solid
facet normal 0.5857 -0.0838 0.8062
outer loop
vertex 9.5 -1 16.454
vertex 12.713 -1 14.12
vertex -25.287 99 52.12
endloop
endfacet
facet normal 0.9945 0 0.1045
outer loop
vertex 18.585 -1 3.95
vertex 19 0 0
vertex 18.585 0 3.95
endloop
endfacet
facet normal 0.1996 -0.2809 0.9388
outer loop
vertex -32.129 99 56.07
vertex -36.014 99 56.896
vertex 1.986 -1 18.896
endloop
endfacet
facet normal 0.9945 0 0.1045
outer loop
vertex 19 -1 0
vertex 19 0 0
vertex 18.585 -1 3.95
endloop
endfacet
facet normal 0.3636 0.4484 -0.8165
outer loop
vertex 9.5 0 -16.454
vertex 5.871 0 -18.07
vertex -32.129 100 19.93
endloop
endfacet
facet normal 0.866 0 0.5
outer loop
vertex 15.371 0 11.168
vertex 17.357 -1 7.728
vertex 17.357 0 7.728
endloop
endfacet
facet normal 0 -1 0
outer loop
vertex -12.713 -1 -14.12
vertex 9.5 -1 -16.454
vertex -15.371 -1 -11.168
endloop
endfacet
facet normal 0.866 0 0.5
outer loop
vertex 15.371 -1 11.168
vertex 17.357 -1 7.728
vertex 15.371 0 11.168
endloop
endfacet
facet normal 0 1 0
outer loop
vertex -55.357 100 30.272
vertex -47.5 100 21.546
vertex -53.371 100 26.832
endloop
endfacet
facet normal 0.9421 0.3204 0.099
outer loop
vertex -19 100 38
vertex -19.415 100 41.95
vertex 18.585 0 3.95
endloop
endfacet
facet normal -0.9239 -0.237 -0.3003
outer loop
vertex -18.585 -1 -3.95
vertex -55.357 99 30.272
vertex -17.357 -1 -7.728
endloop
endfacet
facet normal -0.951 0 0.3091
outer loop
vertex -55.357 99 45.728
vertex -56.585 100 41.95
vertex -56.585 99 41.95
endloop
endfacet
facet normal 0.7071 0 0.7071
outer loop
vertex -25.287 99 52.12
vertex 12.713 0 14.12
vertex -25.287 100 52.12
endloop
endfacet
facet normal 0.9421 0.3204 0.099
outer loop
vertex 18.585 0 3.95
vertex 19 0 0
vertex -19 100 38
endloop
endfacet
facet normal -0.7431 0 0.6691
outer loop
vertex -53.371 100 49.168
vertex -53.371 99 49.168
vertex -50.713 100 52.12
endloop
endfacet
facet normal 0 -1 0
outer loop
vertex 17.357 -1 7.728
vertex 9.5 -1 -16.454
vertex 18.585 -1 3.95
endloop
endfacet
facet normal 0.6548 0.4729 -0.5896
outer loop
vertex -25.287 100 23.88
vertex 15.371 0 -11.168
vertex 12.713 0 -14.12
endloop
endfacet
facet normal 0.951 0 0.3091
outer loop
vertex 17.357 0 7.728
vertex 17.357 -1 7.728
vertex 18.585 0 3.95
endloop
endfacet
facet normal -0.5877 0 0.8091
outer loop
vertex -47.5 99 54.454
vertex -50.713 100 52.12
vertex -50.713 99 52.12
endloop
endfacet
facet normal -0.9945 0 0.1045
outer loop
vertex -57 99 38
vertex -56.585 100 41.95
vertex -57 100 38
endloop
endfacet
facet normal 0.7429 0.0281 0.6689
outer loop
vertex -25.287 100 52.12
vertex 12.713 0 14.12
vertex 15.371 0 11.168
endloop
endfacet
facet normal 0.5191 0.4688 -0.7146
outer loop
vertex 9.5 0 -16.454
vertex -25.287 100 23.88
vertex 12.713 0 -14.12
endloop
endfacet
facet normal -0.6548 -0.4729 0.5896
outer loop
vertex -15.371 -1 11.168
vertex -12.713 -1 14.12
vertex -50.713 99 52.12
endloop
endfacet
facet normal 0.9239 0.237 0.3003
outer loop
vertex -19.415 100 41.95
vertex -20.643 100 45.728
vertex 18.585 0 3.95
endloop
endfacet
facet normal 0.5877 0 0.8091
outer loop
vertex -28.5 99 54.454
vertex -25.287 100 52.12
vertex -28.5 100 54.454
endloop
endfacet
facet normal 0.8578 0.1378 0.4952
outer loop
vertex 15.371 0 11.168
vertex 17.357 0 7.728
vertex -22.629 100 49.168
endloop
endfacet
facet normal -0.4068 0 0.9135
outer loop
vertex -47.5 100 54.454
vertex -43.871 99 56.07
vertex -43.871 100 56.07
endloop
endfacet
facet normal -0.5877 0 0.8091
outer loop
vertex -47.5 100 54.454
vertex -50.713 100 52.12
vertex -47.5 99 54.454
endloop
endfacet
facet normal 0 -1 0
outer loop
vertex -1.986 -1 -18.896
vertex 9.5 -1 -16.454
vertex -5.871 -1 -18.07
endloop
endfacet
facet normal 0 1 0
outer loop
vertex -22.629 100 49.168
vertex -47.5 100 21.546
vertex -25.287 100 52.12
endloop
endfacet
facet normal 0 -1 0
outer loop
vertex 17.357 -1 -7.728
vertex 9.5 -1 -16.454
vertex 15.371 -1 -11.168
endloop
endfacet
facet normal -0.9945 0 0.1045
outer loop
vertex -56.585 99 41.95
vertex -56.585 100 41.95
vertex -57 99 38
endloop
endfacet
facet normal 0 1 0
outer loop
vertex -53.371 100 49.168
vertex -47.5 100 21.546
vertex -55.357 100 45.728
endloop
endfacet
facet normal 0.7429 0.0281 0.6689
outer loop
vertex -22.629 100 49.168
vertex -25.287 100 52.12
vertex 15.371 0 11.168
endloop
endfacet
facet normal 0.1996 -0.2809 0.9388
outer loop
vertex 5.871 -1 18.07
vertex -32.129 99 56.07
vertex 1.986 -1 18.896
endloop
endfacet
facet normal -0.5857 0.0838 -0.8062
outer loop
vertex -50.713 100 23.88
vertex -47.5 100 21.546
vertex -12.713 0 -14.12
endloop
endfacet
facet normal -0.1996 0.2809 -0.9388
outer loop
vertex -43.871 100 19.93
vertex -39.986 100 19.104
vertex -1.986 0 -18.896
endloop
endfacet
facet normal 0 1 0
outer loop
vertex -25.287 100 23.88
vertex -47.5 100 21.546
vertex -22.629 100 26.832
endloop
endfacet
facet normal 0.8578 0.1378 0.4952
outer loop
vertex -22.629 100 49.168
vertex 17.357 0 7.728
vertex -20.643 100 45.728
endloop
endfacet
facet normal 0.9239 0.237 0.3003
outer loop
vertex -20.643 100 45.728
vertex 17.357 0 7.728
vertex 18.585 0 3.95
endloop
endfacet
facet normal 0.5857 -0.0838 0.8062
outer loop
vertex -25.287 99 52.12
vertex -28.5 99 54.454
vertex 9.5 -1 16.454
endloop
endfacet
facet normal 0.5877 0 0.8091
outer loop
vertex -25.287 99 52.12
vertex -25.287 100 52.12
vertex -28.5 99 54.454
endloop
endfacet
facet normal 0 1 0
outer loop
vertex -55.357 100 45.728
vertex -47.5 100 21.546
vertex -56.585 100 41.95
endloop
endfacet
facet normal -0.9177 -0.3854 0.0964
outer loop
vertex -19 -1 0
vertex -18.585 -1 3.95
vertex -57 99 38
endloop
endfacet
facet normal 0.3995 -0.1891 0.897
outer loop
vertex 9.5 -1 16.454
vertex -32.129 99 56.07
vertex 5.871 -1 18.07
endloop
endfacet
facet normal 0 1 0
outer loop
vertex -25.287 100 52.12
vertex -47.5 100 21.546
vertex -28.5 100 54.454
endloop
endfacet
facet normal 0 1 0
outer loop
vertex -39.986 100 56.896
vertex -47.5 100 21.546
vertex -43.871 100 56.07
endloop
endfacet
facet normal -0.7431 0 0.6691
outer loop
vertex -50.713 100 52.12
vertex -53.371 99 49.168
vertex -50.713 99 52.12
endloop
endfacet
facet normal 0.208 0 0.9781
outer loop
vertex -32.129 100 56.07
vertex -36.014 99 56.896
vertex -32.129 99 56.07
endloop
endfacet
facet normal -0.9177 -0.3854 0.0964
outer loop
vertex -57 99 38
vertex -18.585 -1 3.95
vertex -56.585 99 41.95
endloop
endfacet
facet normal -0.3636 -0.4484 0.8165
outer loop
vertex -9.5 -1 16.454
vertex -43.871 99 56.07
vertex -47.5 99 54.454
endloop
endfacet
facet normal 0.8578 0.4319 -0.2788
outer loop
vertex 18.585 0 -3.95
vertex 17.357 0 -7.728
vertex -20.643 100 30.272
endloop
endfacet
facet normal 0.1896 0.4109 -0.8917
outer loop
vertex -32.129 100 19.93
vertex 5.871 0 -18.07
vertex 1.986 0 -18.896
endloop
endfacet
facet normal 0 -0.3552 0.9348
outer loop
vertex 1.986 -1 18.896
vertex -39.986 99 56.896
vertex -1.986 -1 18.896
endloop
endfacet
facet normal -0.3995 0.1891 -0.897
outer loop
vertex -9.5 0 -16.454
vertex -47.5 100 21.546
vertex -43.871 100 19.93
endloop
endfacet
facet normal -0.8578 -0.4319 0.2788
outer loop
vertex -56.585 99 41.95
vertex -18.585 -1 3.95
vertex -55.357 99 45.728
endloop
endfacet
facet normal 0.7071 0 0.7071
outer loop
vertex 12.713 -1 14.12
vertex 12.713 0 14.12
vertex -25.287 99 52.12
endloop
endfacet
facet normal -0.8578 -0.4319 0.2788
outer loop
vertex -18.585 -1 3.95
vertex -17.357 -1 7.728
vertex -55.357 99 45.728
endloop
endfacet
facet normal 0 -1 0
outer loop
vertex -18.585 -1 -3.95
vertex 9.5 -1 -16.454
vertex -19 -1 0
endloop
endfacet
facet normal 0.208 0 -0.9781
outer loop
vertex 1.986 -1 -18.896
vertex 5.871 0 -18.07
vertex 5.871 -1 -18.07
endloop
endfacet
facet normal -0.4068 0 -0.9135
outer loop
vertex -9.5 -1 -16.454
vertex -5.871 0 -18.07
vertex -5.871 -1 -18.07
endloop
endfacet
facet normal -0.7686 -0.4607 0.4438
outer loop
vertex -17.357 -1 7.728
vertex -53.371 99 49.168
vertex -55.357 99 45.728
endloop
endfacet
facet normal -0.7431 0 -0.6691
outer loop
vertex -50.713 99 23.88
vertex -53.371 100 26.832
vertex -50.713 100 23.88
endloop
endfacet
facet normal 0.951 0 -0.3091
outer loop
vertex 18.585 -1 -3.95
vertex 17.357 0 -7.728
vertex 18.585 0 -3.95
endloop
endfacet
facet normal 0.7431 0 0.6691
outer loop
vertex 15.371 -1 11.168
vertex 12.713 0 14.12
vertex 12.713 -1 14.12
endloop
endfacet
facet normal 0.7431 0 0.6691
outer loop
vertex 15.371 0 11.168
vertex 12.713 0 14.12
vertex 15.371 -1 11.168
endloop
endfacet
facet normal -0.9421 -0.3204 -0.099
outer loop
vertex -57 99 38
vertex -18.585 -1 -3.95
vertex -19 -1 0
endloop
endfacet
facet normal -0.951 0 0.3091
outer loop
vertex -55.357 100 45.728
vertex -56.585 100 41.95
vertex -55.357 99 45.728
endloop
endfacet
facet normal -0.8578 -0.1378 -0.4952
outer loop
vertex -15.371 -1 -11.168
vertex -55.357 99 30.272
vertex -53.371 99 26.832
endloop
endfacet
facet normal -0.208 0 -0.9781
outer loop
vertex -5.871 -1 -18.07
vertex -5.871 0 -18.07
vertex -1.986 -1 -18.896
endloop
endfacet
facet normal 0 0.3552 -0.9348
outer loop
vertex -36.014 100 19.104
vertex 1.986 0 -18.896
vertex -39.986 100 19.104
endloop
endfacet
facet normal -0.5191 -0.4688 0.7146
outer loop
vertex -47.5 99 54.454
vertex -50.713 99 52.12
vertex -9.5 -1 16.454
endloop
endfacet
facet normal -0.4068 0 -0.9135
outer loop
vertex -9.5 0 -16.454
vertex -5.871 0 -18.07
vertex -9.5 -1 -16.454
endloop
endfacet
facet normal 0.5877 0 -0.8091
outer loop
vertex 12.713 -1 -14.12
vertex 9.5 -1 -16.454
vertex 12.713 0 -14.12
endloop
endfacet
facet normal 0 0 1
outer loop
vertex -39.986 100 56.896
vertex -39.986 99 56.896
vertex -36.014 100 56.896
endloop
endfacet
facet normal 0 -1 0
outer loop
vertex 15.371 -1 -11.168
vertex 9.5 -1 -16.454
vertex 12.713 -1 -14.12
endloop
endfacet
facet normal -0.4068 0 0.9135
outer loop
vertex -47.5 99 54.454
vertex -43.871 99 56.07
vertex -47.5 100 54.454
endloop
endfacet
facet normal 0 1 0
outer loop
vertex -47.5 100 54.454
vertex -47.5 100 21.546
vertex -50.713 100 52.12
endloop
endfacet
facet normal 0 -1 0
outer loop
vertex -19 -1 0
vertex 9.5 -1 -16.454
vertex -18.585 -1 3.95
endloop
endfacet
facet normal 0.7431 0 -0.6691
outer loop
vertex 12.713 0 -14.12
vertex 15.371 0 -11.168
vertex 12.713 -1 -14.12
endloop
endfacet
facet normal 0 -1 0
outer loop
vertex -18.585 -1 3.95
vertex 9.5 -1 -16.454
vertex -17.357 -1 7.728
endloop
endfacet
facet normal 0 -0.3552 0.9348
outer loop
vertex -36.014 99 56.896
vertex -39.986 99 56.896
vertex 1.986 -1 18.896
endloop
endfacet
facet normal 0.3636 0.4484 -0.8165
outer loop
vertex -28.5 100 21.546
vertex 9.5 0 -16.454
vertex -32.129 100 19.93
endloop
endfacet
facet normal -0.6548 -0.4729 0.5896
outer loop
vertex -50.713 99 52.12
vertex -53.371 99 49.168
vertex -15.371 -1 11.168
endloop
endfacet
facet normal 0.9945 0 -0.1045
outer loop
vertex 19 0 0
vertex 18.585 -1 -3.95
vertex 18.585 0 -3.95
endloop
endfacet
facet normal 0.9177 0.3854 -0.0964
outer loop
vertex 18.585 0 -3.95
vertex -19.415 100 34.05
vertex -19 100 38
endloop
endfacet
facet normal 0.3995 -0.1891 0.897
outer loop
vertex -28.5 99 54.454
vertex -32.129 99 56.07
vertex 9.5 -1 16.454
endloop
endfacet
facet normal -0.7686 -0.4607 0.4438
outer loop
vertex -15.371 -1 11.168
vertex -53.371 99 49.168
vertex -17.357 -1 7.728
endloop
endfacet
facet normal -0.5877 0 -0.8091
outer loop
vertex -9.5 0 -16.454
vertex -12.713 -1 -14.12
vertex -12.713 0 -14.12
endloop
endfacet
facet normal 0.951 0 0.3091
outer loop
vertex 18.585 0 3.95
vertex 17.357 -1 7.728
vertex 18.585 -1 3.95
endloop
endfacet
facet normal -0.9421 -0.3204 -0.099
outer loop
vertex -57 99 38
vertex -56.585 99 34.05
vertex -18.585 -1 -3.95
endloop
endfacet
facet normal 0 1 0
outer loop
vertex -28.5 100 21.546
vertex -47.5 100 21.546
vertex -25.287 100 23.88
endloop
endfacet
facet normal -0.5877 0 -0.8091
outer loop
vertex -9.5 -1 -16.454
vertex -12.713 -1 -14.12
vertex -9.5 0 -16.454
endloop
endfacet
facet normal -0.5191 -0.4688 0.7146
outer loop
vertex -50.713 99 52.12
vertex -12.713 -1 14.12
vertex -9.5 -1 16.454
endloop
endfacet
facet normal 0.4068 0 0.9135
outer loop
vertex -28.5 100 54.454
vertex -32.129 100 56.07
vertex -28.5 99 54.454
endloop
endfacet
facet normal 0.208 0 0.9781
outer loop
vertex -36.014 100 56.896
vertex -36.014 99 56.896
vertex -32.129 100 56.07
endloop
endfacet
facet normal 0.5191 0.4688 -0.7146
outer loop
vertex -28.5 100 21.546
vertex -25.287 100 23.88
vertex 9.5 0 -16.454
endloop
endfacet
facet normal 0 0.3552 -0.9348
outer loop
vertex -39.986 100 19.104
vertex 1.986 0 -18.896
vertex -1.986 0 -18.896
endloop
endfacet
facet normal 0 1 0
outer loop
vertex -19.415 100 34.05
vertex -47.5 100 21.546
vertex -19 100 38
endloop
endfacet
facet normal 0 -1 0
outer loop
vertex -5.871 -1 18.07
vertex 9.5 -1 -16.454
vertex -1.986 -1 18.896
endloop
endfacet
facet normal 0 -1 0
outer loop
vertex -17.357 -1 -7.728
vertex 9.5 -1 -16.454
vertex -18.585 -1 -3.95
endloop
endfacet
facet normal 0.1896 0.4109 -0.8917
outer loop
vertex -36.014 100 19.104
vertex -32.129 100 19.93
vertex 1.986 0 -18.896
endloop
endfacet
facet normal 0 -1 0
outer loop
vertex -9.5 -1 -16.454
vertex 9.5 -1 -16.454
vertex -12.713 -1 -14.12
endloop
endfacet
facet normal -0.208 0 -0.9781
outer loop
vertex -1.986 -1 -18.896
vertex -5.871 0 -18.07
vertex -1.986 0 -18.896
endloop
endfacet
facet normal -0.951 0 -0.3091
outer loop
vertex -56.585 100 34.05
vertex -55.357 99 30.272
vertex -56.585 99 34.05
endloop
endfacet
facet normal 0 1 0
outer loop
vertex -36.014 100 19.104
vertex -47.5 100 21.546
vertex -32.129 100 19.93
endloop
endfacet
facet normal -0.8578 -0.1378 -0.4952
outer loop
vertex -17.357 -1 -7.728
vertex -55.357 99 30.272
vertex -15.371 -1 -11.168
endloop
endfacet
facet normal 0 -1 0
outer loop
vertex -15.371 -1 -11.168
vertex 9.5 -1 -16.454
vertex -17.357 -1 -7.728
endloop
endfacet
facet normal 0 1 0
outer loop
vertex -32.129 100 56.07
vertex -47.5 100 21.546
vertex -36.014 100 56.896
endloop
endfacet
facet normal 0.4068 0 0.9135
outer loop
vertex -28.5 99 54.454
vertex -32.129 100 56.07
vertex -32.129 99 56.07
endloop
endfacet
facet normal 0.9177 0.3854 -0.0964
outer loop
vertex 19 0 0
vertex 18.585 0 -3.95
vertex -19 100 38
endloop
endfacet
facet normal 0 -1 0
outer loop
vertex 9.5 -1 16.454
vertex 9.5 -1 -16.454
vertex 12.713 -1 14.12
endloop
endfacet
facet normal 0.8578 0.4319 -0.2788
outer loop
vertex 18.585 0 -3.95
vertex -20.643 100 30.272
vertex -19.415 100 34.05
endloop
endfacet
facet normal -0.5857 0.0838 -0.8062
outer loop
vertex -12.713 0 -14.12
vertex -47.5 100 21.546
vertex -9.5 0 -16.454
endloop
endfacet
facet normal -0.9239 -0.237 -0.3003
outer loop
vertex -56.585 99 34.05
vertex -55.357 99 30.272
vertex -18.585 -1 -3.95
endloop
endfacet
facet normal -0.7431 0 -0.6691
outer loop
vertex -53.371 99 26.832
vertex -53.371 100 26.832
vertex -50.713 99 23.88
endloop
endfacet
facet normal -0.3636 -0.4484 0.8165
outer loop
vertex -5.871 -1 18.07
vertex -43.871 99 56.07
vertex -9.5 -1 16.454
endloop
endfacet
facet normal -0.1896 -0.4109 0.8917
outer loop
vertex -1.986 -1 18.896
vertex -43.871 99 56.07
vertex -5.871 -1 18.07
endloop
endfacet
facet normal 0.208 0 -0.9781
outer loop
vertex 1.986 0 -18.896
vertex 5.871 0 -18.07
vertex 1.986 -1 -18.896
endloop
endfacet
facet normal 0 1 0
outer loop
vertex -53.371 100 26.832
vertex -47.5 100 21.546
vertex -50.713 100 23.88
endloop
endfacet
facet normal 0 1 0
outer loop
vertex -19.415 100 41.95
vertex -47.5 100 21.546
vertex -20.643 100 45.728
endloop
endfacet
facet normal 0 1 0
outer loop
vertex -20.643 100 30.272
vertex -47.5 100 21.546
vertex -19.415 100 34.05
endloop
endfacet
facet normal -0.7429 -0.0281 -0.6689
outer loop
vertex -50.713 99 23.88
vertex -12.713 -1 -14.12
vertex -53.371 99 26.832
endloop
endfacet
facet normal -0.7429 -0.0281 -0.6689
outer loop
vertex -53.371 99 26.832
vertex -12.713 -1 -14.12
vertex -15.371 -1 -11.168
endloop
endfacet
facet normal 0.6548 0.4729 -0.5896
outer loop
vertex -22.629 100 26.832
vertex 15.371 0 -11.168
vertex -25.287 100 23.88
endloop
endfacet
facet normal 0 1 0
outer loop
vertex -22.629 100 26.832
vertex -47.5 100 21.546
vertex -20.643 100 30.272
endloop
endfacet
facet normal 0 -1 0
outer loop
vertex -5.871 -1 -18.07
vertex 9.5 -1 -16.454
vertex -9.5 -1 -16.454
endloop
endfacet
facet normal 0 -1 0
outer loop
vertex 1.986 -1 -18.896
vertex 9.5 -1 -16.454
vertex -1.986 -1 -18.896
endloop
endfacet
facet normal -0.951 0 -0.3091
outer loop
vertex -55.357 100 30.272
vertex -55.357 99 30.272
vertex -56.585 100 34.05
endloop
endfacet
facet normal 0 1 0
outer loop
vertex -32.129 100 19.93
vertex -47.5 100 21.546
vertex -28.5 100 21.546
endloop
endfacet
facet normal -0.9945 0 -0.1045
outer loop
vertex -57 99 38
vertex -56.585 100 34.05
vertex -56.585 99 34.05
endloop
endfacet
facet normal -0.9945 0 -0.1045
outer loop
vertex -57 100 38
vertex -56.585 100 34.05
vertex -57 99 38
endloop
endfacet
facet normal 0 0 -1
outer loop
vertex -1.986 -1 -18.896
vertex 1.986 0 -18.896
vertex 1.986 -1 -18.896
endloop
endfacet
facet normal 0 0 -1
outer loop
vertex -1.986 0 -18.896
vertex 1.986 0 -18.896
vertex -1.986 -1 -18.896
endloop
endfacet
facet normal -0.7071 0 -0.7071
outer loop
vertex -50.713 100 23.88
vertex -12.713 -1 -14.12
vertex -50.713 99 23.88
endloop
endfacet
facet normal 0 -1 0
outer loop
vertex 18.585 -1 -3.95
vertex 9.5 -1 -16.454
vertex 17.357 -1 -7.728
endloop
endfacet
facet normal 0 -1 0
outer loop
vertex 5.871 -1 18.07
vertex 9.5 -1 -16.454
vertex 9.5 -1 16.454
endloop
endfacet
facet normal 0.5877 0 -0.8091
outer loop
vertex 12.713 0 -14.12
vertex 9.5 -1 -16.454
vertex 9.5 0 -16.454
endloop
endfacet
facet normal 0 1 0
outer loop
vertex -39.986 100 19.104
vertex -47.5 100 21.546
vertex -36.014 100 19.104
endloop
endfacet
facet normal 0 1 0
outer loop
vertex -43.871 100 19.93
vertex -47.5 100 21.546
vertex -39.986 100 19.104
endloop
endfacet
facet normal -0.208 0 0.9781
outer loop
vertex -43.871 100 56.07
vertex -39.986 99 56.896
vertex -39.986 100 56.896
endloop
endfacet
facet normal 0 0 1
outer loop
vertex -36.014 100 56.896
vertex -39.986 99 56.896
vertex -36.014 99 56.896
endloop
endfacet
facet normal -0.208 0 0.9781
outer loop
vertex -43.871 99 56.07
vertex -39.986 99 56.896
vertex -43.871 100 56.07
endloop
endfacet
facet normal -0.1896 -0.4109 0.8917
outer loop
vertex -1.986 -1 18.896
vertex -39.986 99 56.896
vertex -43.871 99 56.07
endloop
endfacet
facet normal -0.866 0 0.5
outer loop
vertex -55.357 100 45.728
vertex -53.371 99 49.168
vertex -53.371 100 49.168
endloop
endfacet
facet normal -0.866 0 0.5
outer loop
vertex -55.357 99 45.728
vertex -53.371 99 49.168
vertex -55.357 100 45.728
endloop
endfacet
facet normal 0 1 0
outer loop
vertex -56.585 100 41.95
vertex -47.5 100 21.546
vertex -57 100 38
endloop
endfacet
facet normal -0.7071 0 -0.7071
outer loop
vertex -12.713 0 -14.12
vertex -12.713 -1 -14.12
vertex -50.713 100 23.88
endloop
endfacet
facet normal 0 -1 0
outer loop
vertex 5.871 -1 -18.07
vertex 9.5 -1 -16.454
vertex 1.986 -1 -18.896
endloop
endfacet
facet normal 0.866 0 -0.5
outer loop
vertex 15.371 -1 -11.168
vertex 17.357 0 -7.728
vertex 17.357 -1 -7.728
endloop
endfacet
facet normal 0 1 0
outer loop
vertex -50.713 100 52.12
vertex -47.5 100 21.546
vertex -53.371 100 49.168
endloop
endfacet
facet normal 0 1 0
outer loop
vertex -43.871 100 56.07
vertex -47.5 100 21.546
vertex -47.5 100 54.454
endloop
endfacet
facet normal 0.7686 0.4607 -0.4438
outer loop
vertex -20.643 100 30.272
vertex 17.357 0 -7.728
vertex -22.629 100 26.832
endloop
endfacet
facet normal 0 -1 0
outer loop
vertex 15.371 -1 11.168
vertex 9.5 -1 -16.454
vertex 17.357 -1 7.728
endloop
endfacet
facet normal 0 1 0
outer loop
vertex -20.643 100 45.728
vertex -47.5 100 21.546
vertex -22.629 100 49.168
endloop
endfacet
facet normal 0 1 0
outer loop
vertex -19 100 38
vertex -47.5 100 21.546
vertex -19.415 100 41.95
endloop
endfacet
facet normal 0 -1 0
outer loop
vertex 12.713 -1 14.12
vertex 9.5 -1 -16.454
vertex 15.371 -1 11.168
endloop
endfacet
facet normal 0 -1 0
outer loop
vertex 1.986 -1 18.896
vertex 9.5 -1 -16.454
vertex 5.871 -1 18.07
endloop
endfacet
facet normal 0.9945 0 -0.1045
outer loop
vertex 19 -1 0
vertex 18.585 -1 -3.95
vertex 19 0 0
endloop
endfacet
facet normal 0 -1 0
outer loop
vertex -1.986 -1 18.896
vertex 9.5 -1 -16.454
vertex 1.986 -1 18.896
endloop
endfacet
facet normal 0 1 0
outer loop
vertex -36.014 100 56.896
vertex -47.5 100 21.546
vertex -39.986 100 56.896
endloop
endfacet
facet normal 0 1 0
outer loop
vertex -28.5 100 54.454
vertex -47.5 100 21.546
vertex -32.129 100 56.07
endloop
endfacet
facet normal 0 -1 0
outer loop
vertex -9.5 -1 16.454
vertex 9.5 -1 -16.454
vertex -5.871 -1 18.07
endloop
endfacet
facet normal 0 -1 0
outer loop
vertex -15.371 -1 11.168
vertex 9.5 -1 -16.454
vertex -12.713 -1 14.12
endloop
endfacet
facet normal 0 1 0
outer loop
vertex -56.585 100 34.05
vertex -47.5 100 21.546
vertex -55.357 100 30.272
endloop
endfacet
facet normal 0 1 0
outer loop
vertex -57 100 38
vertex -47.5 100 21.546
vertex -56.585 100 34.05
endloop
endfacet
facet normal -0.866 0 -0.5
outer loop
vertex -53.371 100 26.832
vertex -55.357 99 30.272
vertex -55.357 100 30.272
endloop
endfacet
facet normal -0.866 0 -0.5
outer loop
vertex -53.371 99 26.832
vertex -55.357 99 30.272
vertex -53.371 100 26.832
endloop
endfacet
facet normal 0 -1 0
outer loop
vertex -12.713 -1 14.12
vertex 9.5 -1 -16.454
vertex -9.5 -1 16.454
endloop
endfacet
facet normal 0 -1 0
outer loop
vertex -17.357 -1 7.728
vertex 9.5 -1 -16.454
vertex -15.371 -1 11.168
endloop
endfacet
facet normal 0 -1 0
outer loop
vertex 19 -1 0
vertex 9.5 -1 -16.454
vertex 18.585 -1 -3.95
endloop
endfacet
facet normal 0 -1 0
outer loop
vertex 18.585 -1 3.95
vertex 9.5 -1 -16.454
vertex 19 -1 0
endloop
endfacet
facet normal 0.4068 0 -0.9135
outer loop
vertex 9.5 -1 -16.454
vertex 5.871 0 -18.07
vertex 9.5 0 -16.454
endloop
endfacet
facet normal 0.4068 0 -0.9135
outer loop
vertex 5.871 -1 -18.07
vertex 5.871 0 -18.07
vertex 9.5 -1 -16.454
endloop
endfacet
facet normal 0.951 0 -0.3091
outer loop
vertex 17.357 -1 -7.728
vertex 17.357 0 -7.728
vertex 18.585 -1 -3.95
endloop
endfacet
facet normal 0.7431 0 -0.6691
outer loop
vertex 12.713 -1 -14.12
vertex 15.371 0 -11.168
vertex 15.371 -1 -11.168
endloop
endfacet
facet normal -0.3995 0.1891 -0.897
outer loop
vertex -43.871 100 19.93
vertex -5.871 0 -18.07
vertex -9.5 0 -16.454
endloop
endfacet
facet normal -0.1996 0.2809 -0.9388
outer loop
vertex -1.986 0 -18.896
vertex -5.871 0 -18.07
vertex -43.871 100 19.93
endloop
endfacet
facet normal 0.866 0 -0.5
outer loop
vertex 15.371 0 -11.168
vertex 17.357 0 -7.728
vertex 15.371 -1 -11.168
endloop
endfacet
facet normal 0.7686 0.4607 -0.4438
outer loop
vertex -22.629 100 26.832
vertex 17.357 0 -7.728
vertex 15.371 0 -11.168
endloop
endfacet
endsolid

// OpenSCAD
coin_small_diameter=30;
coin_big_diameter=36;

holder_border_width=4;
holder_size_x=coin_small_diameter + holder_border_width*2;
holder_size_y=100;
holder_size_z=30;

module holder1(){
        linear_extrude(holder_size_y, twist=0)
        translate([0,0,holder_size_y])
        difference() {
            circle(holder_size_x/2);
            circle(d=holder_size_x- holder_border_width*2);
            
            translate([-holder_size_x/2,0,0])
            square(holder_size_x);
        }
}
module holder2(){
        linear_extrude(holder_size_y, twist=90)
        translate([0,holder_size_z,0])
        
        rotate([0,0,90])
        difference() {
            circle(d=holder_size_x);
            circle(d=holder_size_x- holder_border_width*2);
            
            translate([-holder_size_x/2,0,0])
            square(holder_size_x);
        }
}

module holder(){
        hull() {
            cylinder(d=holder_size_x, h=1);
            
            translate([-holder_size_x,holder_size_x,-holder_size_y])
            cylinder(d=holder_size_x, h=1);
        }
}

rotate([90,0,0])
holder();
